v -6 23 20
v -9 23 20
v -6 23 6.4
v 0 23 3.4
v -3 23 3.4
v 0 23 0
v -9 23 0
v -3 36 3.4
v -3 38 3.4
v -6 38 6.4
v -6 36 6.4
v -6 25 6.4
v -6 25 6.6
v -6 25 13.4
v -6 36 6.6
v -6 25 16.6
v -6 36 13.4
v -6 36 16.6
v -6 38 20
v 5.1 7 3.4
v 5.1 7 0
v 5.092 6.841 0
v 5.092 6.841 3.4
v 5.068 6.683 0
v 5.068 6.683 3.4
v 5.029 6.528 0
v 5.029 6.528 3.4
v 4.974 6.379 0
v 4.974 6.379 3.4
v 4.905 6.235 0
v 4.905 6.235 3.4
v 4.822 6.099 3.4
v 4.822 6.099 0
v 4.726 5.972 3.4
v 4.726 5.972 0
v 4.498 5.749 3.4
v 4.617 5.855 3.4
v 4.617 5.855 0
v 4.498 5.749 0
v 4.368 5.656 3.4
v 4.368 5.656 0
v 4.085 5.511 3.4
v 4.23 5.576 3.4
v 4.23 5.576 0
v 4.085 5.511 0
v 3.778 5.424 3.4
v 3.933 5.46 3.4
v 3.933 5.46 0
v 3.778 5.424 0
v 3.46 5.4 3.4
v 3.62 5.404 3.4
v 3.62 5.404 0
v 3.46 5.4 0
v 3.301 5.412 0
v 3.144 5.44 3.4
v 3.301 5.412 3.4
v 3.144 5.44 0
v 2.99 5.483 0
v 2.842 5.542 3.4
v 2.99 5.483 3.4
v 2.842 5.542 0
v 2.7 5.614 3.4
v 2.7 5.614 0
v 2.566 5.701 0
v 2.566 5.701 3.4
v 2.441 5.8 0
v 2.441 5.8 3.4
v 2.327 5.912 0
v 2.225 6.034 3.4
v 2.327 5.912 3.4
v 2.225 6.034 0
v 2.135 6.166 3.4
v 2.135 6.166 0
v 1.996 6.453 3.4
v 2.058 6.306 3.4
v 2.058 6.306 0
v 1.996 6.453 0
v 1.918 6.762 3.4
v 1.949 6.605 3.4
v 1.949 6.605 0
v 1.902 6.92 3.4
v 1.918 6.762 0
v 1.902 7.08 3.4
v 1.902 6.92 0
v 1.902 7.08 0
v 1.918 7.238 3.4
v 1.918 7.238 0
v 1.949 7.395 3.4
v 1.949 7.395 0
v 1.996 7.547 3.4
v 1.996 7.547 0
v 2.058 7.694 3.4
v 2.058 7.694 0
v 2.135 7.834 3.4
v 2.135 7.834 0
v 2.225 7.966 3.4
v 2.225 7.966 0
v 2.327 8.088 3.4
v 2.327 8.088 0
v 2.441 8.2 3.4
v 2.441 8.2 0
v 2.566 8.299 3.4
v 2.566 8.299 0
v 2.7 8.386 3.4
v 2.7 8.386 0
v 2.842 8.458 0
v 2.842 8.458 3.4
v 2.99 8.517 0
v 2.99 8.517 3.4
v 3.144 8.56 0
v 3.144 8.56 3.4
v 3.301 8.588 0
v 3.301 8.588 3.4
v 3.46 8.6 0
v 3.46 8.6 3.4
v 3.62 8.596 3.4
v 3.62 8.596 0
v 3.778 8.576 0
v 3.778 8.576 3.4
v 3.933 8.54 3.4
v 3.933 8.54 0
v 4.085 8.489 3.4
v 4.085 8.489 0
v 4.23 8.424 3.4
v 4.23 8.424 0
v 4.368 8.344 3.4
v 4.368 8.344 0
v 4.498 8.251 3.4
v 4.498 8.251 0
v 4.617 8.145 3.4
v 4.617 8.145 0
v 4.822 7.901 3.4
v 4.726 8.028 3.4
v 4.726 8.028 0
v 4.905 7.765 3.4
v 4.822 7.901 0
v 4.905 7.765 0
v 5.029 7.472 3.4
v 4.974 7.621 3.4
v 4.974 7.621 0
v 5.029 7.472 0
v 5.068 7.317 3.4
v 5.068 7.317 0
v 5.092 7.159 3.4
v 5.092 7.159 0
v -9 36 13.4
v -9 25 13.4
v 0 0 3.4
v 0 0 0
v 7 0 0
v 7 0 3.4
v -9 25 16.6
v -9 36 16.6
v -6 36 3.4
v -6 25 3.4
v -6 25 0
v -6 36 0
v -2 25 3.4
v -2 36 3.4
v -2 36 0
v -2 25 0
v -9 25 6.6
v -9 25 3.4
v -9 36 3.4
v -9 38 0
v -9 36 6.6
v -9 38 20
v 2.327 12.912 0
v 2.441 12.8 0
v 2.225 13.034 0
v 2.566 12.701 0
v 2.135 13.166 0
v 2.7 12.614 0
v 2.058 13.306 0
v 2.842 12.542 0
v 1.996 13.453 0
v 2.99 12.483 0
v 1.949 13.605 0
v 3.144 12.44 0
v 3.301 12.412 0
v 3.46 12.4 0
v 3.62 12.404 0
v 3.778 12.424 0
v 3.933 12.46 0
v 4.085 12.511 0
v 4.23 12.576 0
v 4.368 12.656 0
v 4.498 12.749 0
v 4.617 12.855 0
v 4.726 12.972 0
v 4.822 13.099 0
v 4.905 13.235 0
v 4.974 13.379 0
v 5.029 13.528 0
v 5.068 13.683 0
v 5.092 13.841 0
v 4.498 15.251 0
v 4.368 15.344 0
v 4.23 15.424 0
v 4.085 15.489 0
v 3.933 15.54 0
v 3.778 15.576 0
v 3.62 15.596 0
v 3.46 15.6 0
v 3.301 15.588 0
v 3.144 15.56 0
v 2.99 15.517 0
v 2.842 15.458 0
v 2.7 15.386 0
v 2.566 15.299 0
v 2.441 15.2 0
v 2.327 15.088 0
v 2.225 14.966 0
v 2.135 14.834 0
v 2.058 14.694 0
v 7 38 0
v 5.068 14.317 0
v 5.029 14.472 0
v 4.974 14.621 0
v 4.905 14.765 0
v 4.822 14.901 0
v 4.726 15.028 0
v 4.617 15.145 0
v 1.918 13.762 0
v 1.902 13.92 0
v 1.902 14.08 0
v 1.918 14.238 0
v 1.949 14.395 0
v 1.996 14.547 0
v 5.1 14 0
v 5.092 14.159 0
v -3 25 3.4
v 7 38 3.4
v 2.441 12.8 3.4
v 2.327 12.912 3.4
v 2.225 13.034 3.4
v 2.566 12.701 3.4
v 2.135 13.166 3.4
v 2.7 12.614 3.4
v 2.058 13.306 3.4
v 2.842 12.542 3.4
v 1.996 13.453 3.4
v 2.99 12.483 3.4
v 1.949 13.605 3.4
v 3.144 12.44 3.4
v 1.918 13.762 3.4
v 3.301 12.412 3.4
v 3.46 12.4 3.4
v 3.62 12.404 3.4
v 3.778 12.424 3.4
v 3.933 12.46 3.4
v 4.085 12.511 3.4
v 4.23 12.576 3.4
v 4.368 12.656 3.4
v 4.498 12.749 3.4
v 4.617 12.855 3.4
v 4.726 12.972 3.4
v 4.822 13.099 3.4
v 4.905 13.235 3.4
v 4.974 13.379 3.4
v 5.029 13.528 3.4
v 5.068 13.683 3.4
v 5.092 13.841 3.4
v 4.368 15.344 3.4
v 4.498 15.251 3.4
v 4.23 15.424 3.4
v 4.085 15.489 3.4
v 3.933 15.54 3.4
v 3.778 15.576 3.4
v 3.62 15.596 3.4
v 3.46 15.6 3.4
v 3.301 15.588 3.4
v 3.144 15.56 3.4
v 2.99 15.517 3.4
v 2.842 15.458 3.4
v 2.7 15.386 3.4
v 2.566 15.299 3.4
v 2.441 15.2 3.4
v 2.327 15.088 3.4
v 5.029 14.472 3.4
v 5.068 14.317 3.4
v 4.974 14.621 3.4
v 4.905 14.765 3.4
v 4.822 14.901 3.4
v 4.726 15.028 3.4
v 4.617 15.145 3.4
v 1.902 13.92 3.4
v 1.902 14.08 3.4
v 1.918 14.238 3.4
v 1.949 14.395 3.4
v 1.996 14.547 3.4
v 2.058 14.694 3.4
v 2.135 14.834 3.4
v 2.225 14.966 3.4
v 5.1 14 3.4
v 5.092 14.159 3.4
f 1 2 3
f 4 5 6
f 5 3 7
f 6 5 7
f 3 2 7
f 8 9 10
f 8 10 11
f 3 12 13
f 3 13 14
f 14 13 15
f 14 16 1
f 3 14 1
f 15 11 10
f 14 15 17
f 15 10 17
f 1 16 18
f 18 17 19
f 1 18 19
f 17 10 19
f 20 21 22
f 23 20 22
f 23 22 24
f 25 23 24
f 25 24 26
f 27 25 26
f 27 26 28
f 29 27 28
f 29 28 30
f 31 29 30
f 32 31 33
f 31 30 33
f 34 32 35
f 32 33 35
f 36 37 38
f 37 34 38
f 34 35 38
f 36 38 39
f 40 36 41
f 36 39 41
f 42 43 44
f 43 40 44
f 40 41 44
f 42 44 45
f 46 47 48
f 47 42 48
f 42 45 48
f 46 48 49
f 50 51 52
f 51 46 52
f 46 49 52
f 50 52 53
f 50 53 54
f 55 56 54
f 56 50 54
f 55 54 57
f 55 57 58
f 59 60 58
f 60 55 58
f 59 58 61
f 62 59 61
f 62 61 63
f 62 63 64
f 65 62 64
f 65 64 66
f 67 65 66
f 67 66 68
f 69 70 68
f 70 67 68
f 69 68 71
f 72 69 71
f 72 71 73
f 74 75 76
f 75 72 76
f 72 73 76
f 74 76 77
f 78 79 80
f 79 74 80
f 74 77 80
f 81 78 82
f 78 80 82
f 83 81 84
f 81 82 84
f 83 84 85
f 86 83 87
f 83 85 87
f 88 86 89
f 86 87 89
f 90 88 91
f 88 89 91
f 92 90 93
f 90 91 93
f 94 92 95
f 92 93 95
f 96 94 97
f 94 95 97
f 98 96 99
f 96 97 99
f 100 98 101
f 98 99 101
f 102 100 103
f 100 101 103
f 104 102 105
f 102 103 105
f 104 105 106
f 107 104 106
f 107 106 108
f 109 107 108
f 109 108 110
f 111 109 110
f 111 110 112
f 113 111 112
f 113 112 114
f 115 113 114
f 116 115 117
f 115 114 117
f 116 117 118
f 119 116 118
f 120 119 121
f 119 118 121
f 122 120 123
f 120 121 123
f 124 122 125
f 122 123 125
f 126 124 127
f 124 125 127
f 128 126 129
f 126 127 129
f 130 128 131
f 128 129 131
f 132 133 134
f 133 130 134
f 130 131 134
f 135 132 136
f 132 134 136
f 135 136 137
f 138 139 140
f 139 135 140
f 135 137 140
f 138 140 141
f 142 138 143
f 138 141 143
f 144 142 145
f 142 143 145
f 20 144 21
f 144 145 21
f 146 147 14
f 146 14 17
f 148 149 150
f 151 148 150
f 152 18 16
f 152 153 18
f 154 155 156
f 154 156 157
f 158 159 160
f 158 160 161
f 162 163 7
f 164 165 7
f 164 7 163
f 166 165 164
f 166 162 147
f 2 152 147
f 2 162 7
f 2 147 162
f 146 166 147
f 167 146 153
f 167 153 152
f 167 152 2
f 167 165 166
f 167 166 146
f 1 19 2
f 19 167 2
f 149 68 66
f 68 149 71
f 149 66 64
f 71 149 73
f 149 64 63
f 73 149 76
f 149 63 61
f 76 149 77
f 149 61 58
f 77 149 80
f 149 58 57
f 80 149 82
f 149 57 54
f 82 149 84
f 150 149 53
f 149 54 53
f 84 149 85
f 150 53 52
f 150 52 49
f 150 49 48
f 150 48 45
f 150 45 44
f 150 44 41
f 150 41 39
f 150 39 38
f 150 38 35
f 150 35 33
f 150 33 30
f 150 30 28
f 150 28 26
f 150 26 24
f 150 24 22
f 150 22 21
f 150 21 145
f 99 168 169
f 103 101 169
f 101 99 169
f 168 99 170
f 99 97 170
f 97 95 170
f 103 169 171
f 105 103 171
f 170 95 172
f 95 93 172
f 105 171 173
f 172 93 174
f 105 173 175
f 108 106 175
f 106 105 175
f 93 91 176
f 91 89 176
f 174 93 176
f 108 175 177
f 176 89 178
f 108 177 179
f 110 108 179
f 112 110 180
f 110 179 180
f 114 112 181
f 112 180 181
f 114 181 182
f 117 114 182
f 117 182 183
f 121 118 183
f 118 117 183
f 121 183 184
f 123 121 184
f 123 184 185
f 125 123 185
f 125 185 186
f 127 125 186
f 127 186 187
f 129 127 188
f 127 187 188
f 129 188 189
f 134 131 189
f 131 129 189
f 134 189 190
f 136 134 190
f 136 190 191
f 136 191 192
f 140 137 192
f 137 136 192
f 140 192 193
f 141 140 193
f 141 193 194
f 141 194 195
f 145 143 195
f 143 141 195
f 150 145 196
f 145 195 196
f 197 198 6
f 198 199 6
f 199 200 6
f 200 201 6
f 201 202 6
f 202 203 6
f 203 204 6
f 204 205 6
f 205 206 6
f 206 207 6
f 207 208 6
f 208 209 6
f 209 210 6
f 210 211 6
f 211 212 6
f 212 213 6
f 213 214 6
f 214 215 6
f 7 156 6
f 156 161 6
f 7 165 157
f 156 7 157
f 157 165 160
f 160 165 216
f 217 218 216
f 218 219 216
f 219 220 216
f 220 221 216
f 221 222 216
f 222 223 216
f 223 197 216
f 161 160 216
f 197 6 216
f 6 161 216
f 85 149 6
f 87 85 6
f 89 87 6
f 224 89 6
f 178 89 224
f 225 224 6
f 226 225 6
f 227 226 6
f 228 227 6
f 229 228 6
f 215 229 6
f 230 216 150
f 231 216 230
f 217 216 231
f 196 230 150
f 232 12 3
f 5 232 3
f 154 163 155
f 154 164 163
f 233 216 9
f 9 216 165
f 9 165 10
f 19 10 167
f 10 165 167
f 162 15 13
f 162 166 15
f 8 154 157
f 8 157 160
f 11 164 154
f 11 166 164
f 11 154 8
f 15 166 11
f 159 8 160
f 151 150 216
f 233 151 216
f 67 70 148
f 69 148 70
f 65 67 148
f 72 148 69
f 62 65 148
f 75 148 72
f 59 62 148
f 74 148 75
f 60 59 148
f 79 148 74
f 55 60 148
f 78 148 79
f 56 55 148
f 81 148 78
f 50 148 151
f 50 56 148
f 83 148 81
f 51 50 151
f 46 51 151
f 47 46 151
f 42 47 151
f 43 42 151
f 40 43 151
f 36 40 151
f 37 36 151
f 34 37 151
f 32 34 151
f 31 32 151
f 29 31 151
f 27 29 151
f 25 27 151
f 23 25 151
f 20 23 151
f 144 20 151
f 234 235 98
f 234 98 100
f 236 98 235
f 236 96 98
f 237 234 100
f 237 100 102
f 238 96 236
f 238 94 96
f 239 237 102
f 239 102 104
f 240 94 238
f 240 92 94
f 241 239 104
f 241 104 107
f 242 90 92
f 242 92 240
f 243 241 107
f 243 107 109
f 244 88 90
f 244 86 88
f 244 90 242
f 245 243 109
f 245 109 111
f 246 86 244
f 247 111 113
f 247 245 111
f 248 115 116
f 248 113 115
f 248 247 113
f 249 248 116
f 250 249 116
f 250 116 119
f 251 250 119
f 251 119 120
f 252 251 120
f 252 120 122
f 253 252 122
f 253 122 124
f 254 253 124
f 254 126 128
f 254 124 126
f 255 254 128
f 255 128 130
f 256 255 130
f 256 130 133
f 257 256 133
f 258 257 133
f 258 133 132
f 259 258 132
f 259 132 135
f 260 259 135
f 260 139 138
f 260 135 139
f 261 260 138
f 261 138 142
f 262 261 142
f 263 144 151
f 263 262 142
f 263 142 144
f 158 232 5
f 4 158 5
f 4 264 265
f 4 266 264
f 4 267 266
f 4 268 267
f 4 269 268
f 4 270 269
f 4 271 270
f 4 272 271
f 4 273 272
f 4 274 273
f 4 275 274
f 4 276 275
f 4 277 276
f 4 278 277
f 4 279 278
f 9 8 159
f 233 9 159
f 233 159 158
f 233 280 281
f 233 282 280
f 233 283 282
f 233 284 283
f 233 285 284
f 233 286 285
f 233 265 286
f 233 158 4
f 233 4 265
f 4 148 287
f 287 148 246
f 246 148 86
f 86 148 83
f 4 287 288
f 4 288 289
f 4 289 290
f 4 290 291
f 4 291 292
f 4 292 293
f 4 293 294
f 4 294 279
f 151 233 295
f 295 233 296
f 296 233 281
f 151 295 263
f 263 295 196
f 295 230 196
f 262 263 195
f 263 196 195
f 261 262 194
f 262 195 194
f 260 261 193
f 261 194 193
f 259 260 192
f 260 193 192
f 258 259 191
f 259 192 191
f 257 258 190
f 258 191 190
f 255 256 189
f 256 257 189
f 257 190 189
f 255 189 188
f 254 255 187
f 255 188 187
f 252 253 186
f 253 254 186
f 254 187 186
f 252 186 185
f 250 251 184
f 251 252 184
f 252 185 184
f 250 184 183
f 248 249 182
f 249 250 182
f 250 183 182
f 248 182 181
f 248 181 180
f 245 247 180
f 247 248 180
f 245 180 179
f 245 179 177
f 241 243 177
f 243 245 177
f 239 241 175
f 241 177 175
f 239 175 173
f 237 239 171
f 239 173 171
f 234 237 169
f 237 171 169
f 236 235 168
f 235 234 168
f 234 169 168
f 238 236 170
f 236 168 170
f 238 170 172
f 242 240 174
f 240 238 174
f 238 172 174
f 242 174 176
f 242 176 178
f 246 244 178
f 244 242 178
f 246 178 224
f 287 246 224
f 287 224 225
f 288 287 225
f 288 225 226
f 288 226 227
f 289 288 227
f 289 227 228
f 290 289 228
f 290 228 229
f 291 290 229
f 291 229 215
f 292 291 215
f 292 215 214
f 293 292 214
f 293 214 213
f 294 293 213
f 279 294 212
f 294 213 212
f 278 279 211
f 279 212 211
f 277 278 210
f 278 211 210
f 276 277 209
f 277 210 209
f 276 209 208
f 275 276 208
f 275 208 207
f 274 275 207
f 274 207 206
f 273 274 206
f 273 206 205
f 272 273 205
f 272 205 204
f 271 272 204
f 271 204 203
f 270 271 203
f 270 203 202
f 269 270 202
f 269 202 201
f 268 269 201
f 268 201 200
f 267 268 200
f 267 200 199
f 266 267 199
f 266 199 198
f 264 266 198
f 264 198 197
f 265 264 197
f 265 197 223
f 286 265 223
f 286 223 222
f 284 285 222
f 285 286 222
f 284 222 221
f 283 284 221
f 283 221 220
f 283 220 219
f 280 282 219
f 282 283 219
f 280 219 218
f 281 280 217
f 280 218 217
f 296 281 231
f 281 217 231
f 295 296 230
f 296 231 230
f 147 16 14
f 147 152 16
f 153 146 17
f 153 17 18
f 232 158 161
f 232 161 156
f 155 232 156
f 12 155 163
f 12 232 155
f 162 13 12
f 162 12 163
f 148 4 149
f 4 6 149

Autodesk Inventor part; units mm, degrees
ref_plane "YZ Plane" through (0, 0, 0) normal (1, 0, 0) x (0, 1, 0)
ref_plane "XZ Plane" through (0, 0, 0) normal (0, 1, 0) x (-1, 0, 0)
ref_plane "XY Plane" through (0, 0, 0) normal (0, 0, 1) x (1, 0, 0)
sketch "Sketch1" plane through (0, 0, 0) normal (0, 0, 1) x (1, 0, 0)
  line L0 (0, 0) -> (7, 0)
  line L1 (7, 0) -> (7, 38)
  line L2 (7, 38) -> (0, 38)
  line L3 (0, 38) -> (0, 0)
  circle A0 centre (3.5, 7) radius 1.6
  circle A1 centre (3.5, 14) radius 1.6
  line L4 (0, 38) -> (-9, 38)
  line L5 (-9, 38) -> (-9, 23)
  line L6 (-9, 23) -> (0, 23)
  line L7 (0, 23) -> (0, 38)
  point P0 (3.5, 0)
  dimension "d0" = 7
  dimension "d1" = 38
  dimension "d2" = 3.2
  dimension "d3" = 3.2
  dimension "d4" = 7
  dimension "d5" = 7
  dimension "d7" = 15
  dimension "d8" = 16
extrude "Extrusion1" add sketch "Sketch1" along normal blind 3.4
sketch "Sketch2" plane through (-9, 23, 0) normal (-1, 0, 0) x (0, 0, 1)
  line L0 (0, 15) -> (0, 0) projected
  line L1 (0, 0) -> (3.4, 0) projected
  line L2 (3.4, 15) -> (3.4, 0) projected
  line L3 (0, 15) -> (3.4, 15) projected
  line L4 (0, 15) -> (20, 15)
  line L5 (20, 15) -> (20, 0)
  line L6 (20, 0) -> (0, 0)
  line L7 (0, 0) -> (0, 15)
  line L8 (3.4, 13) -> (6.6, 13)
  line L9 (6.6, 13) -> (6.6, 2)
  line L10 (6.6, 2) -> (3.4, 2)
  line L11 (3.4, 2) -> (3.4, 13)
  line L12 (13.4, 13) -> (16.6, 13)
  line L13 (16.6, 13) -> (16.6, 2)
  line L14 (16.6, 2) -> (13.4, 2)
  line L15 (13.4, 2) -> (13.4, 13)
  point P0 (0, -23)
  dimension "d11" = 20
  dimension "d12" = 2
  dimension "d13" = 2
  dimension "d14" = 3.2
  dimension "d15" = 3.4
  dimension "d16" = 6.8
  dimension "d17" = 3.2
extrude "Extrusion2" add sketch "Sketch2" against normal blind 3 contours L4 L5 L6 L2 L10 L9 L8
chamfer "Chamfer1" distance 3 angle 45 2 edges at (-6, 37, 3.4) (-6, 24, 3.4)
sketch "Sketch3" plane through (0, 0, 3.4) normal (0, 0, 1) x (1, 0, 0)
  line L0 (-9, 25) -> (-6, 25) projected
  line L1 (-6, 36) -> (-2, 36)
  line L2 (-2, 36) -> (-2, 25)
  line L3 (-2, 25) -> (-6, 25)
  line L4 (-6, 25) -> (-6, 36)
  dimension "d20" = 4
extrude "Extrusion3" cut sketch "Sketch3" against normal blind 4
equation "\"d13\" = d12"
equation "\"d17\" = d14"
properties part number "switch bracket v5"
